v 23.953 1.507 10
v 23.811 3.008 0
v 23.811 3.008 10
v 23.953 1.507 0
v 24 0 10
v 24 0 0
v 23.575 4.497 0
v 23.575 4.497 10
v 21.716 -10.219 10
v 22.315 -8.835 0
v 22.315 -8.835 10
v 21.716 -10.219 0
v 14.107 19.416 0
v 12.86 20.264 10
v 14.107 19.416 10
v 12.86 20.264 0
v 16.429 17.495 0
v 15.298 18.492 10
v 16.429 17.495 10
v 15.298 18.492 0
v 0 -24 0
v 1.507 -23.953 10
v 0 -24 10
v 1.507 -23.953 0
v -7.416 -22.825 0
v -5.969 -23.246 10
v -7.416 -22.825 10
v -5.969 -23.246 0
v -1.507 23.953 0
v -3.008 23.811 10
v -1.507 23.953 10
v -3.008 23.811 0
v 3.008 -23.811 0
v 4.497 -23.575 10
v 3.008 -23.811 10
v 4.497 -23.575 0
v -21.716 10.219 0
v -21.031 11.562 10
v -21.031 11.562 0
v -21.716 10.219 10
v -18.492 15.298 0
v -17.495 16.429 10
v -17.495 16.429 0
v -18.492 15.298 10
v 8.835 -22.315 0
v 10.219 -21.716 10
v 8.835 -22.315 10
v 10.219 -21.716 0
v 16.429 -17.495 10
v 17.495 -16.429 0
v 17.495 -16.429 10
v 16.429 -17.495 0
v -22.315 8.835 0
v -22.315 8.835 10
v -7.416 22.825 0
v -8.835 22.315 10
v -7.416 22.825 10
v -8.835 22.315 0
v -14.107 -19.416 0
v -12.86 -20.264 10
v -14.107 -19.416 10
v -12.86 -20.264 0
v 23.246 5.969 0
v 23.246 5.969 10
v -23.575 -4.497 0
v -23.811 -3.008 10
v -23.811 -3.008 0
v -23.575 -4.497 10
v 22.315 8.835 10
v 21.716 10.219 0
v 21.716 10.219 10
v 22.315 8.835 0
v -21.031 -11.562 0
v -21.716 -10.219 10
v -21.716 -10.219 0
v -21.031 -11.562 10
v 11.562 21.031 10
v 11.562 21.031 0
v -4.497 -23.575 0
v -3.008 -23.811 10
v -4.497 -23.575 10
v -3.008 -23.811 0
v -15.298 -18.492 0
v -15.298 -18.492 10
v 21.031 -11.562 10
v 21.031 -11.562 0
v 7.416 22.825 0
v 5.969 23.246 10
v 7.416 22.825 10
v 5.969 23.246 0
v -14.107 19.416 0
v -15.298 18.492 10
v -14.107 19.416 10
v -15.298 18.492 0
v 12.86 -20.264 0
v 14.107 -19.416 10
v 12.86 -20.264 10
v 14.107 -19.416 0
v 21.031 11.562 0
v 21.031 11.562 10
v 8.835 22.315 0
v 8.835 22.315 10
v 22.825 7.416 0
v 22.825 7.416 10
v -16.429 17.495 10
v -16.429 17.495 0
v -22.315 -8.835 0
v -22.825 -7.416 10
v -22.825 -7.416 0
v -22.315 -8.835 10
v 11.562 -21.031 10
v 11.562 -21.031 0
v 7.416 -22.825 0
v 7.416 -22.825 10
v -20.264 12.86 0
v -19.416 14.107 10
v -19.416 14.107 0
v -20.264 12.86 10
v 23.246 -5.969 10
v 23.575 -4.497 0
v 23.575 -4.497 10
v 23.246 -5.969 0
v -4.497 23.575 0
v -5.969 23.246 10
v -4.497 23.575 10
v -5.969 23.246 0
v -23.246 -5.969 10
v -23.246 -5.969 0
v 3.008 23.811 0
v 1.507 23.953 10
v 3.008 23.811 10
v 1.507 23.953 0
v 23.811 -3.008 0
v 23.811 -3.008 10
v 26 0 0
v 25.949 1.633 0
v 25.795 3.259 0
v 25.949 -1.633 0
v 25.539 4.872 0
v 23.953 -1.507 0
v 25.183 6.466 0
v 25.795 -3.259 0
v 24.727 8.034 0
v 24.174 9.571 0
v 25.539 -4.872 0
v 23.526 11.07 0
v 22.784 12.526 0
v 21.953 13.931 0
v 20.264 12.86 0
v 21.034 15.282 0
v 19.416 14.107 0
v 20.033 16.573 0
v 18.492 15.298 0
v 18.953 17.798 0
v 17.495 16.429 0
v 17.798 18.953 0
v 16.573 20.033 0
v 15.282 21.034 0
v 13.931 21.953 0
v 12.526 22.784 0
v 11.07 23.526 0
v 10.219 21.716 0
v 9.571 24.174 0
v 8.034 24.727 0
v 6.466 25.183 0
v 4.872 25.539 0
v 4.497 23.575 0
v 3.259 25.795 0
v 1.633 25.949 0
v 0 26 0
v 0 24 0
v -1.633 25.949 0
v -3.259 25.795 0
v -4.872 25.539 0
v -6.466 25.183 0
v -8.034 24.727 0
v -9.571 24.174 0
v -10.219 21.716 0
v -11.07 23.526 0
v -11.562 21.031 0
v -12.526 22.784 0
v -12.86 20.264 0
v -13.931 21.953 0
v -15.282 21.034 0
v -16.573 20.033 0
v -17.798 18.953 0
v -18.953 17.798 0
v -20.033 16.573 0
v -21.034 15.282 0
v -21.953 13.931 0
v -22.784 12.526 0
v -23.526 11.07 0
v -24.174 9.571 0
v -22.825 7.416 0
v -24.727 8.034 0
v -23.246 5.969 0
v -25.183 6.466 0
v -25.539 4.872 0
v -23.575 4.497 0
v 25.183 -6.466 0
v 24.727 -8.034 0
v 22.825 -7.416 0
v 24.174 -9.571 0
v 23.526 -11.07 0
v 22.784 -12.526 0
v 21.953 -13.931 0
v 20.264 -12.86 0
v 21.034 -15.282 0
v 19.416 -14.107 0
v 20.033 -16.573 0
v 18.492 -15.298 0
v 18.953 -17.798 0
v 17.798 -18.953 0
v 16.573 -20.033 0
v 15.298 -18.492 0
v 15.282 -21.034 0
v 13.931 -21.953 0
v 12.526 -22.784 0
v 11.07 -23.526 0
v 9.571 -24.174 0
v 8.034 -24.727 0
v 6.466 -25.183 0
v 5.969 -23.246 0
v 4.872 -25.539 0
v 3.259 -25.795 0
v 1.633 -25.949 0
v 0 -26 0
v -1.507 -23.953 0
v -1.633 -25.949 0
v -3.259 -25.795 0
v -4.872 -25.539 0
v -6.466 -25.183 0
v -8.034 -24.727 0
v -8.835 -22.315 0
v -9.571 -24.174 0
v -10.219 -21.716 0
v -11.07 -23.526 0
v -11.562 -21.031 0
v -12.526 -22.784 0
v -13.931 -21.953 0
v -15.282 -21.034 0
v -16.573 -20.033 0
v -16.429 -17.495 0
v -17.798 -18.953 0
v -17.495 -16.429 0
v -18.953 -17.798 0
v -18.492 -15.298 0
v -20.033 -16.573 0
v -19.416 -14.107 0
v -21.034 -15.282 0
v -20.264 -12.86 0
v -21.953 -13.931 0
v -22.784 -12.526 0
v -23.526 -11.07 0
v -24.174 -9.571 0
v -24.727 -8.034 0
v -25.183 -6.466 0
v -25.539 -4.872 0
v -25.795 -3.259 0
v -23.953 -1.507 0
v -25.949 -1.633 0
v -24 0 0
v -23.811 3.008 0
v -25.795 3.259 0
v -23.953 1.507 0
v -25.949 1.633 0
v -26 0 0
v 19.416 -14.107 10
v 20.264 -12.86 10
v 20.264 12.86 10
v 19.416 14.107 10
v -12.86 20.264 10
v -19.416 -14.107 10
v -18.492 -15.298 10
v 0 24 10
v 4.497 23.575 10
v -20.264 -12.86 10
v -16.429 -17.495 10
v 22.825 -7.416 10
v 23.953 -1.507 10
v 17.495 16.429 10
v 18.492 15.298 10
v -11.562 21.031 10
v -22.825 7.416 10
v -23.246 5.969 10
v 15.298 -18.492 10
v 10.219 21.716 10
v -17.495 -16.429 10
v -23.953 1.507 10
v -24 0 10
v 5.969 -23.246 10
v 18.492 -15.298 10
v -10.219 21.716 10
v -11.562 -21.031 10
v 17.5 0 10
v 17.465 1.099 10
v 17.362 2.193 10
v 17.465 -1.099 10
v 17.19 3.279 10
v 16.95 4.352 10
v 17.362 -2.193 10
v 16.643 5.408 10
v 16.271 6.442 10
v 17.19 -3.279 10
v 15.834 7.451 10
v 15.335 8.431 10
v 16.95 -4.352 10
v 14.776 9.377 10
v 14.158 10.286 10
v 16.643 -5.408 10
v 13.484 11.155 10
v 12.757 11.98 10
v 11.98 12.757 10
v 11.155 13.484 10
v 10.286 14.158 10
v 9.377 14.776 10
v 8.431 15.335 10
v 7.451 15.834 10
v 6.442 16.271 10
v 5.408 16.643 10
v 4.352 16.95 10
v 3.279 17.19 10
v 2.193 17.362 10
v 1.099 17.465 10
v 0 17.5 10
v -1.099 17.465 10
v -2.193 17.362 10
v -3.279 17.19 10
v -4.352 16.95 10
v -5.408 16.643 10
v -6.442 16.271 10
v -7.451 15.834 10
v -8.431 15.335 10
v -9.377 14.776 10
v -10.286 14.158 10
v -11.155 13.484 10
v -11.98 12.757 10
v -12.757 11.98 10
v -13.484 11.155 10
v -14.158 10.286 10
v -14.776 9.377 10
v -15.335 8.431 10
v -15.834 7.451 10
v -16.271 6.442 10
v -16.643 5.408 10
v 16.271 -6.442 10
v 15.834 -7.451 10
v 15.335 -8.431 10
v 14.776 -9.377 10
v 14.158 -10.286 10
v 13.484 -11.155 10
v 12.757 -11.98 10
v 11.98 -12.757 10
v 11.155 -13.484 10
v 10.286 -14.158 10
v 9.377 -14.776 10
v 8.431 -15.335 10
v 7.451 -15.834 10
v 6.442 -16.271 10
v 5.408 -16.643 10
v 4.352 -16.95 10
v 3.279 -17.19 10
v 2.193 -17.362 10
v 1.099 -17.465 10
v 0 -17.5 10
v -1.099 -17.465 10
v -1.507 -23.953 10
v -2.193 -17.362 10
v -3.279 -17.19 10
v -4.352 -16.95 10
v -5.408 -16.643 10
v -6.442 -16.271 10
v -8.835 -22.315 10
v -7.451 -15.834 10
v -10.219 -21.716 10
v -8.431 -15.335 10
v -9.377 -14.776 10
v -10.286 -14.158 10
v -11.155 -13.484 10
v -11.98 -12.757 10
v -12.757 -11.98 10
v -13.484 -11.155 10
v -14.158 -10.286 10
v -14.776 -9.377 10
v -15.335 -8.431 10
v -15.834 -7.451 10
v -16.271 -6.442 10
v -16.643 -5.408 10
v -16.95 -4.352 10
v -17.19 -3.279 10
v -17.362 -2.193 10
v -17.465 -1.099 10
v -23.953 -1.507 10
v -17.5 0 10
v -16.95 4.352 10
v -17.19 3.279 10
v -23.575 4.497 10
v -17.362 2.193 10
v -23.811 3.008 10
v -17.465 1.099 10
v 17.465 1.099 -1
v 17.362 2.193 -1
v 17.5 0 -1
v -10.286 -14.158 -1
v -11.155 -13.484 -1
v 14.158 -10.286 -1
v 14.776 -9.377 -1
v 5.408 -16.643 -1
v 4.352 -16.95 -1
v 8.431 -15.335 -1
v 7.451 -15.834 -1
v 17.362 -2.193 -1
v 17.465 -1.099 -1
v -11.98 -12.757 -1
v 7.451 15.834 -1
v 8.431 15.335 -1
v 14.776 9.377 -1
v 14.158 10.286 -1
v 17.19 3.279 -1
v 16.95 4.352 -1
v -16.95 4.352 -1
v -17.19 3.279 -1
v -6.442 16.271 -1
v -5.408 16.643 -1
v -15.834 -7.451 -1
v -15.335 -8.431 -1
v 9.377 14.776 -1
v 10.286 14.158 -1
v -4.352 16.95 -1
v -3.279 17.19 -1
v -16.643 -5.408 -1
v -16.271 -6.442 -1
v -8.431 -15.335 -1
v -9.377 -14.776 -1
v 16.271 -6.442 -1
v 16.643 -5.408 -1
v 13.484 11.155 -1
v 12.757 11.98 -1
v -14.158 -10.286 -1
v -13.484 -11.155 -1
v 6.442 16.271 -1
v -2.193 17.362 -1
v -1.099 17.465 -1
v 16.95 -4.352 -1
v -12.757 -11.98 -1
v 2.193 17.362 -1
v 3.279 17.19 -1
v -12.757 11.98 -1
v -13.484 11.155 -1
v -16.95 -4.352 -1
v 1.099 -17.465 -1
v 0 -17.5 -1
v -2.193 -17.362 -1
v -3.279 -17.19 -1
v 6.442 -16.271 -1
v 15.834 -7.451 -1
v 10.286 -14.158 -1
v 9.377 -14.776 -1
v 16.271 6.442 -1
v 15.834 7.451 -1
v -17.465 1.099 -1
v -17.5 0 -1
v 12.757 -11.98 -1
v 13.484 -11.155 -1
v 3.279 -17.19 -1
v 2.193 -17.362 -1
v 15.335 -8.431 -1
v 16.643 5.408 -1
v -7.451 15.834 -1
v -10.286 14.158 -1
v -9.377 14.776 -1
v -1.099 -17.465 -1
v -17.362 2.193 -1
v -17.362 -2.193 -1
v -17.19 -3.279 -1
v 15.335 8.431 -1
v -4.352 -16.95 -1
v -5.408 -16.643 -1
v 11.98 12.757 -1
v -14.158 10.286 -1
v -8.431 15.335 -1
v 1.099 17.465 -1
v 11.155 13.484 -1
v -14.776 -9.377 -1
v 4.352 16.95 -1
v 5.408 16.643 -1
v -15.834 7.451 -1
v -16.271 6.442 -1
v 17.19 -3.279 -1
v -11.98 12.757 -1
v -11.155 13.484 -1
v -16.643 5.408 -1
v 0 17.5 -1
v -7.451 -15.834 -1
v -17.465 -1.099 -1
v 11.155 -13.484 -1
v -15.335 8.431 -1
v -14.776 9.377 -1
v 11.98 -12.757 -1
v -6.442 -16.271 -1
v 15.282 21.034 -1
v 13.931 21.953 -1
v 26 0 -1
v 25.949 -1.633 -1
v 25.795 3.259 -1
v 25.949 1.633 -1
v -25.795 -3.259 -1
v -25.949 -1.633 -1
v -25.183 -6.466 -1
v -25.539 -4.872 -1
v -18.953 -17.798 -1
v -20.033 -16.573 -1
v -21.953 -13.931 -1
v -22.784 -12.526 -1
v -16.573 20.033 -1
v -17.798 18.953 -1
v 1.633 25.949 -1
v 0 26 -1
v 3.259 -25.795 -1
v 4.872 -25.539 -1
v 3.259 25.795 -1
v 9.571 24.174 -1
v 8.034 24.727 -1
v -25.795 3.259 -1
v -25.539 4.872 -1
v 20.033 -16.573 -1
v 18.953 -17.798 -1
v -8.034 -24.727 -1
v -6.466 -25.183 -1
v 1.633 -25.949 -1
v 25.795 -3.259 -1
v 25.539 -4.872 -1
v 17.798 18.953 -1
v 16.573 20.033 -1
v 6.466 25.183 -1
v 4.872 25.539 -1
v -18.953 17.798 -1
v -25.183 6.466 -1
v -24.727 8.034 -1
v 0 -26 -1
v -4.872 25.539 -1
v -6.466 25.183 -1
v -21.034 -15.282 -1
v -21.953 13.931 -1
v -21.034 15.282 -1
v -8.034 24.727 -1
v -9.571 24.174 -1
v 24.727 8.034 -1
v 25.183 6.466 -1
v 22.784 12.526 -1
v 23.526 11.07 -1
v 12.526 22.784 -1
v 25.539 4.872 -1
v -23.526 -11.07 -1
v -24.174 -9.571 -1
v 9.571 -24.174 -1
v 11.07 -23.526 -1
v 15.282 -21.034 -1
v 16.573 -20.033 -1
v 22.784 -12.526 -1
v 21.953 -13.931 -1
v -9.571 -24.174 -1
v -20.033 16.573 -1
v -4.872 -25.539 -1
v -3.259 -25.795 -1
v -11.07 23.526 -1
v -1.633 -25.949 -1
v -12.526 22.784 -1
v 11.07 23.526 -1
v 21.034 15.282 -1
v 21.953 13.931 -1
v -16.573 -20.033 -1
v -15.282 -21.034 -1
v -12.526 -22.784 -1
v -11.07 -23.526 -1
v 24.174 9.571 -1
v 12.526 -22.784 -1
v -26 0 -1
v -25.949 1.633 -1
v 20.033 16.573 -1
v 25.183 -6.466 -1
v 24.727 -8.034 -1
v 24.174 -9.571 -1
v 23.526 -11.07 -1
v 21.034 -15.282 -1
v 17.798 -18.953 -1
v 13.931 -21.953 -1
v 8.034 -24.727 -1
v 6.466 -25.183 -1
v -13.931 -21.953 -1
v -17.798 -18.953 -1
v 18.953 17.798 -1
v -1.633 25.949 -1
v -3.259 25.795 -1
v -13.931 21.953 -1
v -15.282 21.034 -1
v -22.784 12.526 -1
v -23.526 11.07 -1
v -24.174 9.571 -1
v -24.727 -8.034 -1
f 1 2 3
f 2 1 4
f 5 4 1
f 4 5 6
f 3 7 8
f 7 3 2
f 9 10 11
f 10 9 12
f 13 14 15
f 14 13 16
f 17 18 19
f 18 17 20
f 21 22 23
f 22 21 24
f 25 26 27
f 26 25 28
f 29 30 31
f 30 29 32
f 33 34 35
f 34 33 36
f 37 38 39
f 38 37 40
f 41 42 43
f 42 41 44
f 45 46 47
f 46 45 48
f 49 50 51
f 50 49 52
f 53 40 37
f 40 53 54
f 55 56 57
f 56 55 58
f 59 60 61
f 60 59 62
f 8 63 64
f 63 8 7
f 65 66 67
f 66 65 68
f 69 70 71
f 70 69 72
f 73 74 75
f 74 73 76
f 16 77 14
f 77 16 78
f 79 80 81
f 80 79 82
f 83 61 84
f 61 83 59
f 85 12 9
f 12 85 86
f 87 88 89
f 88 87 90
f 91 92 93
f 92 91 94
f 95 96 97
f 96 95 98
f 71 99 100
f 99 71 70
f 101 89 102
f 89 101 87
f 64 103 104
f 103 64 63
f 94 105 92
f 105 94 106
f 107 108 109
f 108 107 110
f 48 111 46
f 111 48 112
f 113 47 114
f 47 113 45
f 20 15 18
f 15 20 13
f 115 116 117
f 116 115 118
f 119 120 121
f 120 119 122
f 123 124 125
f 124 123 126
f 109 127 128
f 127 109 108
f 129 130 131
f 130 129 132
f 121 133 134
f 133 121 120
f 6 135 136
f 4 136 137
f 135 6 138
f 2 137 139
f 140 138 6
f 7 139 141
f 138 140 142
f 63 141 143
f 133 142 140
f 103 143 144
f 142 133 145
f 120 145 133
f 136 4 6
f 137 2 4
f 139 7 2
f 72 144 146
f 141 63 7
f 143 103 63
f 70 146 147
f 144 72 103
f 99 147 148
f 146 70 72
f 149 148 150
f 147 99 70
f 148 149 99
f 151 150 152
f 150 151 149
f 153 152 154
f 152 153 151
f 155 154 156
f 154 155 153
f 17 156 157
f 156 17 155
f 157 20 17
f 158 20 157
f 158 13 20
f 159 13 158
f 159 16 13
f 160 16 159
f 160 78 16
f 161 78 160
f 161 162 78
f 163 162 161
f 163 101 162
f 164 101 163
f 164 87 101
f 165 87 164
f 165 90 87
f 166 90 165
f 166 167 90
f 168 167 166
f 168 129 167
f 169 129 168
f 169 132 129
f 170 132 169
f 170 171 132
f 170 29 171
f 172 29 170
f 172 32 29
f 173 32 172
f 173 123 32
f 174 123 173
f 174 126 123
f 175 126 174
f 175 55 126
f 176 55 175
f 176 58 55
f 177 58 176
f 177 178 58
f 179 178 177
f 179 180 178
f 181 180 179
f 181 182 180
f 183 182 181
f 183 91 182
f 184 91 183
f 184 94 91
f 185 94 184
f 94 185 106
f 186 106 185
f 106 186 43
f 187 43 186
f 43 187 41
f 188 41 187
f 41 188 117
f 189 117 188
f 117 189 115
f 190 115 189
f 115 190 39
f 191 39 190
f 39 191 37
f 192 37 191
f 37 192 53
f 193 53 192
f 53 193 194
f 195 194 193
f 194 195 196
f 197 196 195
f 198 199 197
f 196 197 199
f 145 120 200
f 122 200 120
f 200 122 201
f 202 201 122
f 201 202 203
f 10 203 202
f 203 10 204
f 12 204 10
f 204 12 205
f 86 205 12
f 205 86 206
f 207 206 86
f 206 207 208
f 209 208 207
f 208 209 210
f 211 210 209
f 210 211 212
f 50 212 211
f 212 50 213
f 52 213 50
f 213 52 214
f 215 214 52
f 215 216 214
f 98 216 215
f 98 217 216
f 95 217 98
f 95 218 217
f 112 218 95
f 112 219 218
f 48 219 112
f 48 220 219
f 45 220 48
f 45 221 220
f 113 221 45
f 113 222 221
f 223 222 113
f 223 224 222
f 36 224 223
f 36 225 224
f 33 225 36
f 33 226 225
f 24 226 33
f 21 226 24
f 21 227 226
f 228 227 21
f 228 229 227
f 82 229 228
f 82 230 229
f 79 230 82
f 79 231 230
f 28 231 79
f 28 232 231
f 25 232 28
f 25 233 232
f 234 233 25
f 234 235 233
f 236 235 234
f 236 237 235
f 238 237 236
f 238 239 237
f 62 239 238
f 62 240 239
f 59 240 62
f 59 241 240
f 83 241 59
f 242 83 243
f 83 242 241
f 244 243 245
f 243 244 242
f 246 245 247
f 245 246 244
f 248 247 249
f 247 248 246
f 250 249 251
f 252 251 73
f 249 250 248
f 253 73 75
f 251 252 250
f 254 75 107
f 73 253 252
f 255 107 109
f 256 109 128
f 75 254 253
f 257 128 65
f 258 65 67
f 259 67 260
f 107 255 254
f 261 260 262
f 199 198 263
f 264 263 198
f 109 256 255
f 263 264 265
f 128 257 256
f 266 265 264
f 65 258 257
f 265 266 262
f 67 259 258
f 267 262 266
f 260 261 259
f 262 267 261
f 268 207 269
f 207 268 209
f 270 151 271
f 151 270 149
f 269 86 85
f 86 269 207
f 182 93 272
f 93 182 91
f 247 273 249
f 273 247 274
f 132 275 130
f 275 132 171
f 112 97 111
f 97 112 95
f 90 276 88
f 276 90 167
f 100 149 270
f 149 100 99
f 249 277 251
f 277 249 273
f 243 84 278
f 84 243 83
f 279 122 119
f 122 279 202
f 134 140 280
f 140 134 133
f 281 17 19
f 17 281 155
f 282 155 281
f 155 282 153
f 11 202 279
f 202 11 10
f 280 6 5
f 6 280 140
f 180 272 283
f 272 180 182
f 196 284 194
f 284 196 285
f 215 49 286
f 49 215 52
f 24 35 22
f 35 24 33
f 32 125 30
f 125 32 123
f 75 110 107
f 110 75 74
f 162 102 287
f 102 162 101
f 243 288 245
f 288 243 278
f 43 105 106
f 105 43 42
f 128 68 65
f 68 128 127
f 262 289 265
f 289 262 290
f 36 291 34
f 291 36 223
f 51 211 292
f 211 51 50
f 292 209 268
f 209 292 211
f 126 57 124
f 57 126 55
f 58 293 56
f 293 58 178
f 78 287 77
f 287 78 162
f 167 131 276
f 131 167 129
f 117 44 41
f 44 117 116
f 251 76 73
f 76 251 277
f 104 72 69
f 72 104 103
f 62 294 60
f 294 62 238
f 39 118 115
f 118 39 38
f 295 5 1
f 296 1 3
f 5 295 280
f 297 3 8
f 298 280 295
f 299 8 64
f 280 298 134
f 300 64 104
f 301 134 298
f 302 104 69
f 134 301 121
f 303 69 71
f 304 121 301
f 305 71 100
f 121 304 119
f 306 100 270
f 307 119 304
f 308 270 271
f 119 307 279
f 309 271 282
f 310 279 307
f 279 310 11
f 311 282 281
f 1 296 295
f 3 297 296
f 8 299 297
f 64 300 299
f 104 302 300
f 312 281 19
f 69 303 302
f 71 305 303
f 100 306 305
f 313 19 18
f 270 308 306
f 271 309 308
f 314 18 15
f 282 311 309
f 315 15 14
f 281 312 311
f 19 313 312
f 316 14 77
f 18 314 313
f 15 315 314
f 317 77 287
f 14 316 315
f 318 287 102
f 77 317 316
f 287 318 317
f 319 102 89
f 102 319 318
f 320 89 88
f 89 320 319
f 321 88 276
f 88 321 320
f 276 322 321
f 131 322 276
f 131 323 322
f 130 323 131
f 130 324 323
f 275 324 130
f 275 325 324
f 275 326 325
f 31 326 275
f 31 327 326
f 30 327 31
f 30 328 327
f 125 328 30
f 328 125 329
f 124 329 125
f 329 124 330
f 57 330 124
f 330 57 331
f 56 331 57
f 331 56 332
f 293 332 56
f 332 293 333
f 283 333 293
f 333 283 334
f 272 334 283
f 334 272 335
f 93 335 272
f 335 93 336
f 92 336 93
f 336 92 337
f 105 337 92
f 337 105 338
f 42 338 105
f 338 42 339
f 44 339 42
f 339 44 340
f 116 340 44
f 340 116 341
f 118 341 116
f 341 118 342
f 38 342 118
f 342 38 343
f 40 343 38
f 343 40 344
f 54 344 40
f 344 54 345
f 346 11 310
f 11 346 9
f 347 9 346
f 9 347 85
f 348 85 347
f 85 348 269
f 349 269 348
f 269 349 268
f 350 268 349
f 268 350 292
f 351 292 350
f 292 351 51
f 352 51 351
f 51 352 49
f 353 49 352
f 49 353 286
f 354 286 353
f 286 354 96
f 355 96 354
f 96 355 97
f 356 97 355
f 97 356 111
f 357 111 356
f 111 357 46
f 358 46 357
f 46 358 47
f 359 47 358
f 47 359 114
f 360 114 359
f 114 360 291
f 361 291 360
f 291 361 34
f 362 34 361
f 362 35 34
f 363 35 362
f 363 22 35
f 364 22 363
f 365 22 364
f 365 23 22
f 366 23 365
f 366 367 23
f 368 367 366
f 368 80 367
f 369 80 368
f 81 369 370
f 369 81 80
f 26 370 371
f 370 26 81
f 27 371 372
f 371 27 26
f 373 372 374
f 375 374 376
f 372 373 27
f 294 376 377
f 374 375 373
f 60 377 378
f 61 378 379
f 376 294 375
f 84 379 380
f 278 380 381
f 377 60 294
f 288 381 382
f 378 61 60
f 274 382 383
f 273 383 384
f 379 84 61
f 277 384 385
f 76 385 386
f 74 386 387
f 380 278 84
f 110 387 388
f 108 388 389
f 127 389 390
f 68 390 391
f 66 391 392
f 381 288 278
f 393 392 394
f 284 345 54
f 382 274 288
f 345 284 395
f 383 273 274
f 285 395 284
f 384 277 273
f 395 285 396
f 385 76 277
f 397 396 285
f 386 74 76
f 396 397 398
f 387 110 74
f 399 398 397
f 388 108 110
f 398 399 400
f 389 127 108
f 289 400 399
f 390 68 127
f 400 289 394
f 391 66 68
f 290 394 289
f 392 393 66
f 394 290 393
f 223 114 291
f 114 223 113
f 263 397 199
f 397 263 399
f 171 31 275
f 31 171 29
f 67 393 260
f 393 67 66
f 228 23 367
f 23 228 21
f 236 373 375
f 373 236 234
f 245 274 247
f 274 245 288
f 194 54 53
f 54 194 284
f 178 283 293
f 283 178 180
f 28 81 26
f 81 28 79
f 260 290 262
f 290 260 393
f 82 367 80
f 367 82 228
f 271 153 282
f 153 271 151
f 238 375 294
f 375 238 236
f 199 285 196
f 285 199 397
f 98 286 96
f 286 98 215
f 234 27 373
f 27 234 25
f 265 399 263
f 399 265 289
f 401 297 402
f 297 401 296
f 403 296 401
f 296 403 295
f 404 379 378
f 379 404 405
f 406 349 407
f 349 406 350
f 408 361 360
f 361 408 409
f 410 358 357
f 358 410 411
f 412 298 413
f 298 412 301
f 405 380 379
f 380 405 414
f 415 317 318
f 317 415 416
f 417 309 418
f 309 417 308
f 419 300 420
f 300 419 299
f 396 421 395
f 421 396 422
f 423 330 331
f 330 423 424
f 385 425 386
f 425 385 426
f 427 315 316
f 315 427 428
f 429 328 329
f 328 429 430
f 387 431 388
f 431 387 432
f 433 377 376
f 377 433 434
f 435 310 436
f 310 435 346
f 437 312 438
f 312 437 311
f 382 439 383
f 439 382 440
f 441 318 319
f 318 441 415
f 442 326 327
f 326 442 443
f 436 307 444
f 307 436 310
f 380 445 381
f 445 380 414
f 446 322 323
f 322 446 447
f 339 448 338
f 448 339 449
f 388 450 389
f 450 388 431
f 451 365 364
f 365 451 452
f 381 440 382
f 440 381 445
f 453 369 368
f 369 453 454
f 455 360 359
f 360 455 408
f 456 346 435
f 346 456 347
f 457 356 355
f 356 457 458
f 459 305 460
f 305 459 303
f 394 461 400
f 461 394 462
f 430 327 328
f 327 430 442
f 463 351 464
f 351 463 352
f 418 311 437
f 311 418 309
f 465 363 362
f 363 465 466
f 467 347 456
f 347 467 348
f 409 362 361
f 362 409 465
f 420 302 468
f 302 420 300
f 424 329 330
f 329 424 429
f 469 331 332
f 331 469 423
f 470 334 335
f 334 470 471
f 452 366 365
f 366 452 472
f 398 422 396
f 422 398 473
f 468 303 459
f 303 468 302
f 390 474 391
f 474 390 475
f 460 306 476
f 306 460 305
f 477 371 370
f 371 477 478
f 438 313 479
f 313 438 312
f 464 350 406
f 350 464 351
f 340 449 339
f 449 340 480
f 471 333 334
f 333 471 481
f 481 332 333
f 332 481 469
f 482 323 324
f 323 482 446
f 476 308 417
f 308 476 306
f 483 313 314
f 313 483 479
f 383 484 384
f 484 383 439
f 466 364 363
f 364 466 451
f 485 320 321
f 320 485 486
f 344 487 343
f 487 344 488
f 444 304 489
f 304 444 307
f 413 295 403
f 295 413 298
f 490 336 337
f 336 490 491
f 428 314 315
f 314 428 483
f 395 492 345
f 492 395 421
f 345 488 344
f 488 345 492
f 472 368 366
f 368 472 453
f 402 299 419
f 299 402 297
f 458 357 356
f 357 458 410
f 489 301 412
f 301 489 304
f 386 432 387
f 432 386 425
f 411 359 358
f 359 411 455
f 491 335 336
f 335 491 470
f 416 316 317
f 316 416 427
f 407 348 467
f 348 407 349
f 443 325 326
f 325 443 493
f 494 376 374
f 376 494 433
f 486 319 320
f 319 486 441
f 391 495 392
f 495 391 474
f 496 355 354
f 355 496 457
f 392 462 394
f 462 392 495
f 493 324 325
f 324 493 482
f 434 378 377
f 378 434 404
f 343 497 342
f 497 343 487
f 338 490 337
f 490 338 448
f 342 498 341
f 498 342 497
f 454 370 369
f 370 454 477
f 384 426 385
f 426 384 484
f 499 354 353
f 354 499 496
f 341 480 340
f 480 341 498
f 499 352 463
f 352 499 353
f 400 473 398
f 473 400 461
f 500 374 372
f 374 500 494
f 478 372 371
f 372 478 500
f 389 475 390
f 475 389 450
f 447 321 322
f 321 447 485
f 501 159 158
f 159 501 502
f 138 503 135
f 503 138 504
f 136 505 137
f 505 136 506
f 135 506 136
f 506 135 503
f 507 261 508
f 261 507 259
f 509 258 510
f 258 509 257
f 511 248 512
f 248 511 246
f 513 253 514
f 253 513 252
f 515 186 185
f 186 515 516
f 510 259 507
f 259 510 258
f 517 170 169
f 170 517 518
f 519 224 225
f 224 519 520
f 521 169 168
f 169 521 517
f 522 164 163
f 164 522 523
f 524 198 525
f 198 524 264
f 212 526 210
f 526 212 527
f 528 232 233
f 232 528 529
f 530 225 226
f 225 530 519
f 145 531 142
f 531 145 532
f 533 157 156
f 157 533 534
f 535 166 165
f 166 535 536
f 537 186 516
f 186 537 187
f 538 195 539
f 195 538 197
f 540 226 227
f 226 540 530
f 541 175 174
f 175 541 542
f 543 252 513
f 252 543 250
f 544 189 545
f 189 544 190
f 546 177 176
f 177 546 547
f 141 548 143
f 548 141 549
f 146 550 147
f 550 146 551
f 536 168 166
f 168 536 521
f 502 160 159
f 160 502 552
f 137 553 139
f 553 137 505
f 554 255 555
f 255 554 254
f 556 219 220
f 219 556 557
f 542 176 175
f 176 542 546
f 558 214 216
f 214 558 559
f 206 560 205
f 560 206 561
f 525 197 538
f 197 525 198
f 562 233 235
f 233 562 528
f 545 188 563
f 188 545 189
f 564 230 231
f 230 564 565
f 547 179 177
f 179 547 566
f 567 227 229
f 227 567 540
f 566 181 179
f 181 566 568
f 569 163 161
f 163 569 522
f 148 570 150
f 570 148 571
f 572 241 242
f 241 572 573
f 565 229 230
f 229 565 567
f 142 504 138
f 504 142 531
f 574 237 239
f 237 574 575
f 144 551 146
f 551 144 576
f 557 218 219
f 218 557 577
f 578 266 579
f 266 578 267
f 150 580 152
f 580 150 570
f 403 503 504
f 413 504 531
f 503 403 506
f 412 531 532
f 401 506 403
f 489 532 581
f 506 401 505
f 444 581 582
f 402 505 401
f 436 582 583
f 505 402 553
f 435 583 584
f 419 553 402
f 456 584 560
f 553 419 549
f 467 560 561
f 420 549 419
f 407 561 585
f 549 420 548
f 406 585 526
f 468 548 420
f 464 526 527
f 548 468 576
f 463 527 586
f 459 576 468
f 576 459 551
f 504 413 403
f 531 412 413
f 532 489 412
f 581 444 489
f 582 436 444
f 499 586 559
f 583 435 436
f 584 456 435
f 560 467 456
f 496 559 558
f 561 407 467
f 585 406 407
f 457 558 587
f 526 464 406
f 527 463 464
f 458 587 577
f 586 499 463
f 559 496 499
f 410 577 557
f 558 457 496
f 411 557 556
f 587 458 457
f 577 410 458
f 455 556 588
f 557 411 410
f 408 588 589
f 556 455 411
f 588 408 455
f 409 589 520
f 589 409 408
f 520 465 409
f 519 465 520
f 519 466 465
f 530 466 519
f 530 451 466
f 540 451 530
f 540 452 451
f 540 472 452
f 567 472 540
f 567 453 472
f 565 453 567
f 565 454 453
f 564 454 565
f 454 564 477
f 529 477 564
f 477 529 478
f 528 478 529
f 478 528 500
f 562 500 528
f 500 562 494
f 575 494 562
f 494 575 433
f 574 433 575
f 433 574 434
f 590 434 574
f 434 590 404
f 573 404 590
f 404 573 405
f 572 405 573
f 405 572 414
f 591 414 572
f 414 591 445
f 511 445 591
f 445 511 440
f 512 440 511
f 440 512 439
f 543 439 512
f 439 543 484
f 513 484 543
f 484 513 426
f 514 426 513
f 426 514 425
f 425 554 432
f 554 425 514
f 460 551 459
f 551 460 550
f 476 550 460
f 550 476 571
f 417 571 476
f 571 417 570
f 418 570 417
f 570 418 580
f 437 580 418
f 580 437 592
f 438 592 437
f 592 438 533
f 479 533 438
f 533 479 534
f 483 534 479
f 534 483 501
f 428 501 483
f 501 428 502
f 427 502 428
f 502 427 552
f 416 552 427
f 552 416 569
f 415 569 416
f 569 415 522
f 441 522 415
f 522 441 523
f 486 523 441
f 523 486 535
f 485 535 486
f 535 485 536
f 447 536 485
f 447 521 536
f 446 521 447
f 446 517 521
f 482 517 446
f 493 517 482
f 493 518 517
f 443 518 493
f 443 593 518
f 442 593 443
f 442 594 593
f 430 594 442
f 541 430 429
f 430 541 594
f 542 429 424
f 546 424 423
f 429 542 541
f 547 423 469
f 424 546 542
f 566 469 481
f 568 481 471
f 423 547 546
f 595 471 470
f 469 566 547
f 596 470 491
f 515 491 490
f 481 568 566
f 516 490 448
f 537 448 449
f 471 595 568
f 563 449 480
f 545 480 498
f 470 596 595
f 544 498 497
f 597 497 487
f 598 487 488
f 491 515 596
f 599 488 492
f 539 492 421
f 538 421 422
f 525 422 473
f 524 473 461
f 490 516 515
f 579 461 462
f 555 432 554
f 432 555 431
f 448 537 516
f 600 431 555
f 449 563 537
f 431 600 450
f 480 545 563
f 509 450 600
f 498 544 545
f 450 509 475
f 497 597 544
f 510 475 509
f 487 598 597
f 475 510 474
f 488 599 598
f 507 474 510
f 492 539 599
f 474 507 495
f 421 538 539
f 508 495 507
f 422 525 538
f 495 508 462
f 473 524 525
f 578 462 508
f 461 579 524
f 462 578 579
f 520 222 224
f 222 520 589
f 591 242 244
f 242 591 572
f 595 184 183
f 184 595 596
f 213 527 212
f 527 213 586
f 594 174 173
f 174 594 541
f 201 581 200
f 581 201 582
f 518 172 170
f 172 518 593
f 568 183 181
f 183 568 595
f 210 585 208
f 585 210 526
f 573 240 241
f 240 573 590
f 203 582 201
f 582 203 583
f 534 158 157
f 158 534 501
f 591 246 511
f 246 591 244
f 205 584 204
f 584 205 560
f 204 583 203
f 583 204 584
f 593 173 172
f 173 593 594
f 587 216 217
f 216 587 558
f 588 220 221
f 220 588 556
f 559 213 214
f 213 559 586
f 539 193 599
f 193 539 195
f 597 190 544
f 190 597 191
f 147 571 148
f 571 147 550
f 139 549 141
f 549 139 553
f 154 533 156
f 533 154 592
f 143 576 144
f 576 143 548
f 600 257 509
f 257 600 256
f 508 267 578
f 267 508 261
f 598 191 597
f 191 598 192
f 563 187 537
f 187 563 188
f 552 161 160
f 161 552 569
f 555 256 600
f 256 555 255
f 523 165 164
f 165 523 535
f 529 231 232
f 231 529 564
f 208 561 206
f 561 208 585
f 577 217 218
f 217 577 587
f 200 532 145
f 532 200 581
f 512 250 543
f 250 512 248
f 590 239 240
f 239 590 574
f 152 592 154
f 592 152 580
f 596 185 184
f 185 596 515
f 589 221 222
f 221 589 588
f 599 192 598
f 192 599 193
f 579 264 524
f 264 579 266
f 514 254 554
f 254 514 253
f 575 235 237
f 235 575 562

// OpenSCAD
$fn = 100; // set to 100 to print

// this model facilitates the connection of a vacuum hose into a Rutland's Cyclone Dust Collector with 30L Drum: https://www.rutlands.com/products/cyclone-dust-collector-with-30l-drum

// inner diameter width of cyclone in mm
cyclone_id = 48;

// outer diameter of lip of adapter in mm
lip_od = 52;
// thickness of lip (height) in mm
lip_thickness = 1;

// outer diameter of vacuum hose
vacuum_od = 35;

// depth of adapter in mm, exclusive of lip
depth = 10;

// render base
difference() {
    cylinder(depth,cyclone_id/2,cyclone_id/2); //h,r1,r2
    cylinder(depth,vacuum_od/2,vacuum_od/2);
}

// render lip
translate([0,0,-lip_thickness])
    difference() {
        cylinder(lip_thickness, lip_od/2, lip_od/2);
        cylinder(depth,vacuum_od/2,vacuum_od/2);
    }
